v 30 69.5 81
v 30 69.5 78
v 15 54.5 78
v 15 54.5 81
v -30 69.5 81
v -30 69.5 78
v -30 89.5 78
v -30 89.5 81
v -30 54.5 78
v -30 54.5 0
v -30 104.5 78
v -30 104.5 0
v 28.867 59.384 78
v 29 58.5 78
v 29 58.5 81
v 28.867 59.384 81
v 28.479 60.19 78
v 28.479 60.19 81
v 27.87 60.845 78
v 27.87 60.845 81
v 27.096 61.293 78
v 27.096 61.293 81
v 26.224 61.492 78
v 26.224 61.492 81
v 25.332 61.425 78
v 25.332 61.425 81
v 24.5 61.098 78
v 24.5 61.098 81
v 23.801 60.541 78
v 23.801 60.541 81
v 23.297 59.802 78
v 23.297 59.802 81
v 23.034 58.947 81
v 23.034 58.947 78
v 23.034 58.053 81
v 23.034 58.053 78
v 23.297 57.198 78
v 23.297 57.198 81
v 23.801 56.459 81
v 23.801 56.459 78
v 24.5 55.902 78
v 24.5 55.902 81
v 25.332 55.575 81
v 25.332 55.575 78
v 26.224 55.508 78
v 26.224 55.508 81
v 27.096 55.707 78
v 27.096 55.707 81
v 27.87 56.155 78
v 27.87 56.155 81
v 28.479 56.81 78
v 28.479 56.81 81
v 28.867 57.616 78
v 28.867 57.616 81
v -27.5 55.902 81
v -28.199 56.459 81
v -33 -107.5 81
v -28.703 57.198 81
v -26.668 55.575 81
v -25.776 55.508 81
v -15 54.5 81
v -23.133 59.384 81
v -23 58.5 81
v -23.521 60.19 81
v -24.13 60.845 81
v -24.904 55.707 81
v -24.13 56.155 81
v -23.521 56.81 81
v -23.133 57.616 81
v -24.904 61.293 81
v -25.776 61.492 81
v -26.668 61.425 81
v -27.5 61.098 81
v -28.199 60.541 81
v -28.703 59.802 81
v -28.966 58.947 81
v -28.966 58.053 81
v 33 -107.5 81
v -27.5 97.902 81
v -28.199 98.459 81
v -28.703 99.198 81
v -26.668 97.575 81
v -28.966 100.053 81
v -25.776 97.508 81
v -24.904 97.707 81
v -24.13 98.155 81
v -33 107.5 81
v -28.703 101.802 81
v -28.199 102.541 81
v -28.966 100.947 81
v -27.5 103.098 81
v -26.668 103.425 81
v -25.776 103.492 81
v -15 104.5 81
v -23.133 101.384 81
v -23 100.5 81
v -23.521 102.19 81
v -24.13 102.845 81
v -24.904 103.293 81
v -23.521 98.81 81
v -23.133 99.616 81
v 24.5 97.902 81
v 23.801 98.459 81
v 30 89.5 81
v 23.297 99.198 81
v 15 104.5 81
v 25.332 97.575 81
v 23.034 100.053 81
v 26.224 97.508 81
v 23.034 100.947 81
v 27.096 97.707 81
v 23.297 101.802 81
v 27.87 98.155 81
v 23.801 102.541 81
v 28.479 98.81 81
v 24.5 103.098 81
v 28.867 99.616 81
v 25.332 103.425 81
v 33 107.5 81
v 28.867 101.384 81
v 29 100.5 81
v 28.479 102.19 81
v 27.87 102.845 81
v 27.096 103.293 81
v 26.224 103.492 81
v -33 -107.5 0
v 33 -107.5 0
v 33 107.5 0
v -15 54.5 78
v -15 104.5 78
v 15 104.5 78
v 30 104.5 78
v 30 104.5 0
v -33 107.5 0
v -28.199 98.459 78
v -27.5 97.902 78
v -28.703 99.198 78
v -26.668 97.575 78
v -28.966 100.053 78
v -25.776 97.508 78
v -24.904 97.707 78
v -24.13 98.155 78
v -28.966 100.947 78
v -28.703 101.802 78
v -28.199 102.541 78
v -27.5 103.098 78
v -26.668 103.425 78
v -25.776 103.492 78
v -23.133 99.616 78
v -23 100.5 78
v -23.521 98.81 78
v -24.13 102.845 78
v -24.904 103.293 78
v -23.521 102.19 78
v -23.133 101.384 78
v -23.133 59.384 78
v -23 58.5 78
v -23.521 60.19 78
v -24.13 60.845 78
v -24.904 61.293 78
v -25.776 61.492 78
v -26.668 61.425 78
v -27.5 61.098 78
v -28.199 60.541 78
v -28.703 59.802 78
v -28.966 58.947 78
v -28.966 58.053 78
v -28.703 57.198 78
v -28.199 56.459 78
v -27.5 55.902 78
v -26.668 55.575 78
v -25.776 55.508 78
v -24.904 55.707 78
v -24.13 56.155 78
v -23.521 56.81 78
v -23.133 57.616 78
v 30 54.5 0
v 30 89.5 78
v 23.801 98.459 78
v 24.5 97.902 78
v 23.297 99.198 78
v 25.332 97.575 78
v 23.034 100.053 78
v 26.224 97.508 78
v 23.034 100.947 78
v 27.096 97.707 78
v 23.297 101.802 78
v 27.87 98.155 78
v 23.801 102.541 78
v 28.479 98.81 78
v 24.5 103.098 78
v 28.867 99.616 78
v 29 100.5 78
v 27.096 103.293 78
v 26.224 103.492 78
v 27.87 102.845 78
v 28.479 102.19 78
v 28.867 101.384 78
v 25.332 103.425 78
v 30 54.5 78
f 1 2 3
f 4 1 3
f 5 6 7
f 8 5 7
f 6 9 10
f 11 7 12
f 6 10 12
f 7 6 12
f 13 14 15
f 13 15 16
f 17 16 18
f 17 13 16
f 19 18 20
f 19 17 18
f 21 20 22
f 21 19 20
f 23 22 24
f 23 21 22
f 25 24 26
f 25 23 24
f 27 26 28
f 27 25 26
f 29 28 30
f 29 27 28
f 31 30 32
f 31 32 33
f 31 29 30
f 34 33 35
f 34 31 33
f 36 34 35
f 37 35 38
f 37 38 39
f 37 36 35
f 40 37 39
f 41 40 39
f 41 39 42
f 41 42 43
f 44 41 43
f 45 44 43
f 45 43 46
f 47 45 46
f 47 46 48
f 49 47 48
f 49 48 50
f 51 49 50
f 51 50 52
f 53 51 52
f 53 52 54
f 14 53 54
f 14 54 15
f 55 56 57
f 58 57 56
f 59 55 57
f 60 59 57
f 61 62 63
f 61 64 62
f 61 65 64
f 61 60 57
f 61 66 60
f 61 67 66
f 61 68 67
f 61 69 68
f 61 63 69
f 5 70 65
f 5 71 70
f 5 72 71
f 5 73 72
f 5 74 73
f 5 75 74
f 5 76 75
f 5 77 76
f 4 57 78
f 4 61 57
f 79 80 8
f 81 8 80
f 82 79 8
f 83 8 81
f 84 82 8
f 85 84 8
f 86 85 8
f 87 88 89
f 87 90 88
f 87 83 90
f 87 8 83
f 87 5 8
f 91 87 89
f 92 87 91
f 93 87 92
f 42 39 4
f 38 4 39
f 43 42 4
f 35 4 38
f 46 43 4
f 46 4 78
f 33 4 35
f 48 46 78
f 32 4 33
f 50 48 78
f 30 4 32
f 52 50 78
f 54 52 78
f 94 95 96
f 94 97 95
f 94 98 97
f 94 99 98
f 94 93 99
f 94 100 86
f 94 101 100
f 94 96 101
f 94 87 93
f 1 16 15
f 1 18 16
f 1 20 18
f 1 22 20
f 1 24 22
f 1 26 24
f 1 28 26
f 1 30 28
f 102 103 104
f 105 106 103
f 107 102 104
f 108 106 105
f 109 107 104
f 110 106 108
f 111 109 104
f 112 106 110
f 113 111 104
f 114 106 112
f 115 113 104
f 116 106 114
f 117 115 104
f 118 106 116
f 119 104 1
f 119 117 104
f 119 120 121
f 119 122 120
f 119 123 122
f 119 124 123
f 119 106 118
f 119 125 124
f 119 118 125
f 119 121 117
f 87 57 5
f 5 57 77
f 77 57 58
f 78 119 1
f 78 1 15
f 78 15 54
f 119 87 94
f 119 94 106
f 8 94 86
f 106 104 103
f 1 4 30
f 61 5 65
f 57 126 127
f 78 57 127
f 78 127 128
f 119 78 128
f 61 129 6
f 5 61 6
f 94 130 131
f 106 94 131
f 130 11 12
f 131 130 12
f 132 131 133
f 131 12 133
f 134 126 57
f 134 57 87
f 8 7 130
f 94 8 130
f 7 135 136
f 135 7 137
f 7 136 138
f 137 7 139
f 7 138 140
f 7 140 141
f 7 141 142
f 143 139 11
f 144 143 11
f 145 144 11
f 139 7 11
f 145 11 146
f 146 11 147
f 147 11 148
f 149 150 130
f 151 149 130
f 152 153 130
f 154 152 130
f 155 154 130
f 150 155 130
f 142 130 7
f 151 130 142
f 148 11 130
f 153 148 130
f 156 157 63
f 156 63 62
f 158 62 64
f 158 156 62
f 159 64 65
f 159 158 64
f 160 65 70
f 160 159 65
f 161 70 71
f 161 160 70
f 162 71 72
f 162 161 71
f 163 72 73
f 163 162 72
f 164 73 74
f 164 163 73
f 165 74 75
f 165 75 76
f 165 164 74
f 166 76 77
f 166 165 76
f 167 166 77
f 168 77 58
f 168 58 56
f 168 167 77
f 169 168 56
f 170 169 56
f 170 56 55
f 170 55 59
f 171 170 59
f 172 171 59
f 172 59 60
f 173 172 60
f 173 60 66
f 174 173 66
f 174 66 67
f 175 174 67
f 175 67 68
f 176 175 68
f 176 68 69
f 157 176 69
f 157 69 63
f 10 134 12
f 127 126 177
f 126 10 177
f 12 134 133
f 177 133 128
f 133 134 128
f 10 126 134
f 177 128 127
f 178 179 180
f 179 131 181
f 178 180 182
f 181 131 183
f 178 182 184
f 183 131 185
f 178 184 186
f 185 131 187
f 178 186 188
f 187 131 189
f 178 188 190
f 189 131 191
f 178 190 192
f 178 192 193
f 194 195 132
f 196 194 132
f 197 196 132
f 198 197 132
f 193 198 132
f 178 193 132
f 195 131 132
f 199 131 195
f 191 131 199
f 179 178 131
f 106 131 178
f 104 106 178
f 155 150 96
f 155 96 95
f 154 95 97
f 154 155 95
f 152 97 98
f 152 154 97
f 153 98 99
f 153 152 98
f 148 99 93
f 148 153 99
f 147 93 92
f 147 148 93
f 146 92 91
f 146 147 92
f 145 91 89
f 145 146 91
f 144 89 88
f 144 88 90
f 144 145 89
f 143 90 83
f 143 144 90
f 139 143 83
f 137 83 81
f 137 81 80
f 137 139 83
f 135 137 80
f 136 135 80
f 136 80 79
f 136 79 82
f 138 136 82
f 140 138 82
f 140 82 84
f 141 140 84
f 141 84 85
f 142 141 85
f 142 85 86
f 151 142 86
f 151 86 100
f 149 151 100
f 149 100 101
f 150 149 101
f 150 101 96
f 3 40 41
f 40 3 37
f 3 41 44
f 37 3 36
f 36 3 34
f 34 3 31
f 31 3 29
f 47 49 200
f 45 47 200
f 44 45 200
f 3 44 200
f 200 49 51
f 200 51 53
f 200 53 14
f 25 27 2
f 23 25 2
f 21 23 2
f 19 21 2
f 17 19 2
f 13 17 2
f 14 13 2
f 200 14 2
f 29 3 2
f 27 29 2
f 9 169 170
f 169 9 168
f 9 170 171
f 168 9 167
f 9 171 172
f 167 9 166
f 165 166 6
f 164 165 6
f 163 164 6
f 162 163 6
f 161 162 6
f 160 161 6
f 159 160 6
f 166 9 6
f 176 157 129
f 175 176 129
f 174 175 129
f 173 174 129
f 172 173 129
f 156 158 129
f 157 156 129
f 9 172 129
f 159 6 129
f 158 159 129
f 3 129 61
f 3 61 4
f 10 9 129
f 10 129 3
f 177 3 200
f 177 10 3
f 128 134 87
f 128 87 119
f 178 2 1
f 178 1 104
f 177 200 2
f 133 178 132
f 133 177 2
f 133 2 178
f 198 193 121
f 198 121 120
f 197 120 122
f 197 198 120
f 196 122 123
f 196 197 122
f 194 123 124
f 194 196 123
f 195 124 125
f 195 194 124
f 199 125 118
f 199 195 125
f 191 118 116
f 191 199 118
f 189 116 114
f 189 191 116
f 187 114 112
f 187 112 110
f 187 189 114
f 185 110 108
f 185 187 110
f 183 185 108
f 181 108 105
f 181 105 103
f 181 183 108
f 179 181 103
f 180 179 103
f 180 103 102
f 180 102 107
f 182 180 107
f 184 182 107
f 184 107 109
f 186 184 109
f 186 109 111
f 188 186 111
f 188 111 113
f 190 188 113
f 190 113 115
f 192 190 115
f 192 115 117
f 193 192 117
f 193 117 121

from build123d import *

# Parameters (mm, degrees)
STRUCTURESKETCH_W      = 66
STRUCTURESKETCH_H      = 215
MAINSTRUCTURE_DEPTH    = 81
ZONESKETCH_R           = 3
CENTERPOCKET_DEPTH     = 81
ZONEFILLSKETCH_W       = 60
ZONEFILLSKETCH_H       = 50
CENTERFILLPOCKET_DEPTH = 78


with BuildPart() as part:
    # StructureSketch → MainStructure (new body)
    with BuildSketch(Plane.XY):
        Rectangle(STRUCTURESKETCH_W, STRUCTURESKETCH_H)
    extrude(amount=MAINSTRUCTURE_DEPTH)

    # ZoneSketch (on DatumPlane) → CenterPocket (cut)
    with BuildSketch(Plane(origin=(0, 79.5, 0), x_dir=(1, 0, 0), z_dir=(0, 0, 1))):
        with Locations((-26, 21)):
            Circle(ZONESKETCH_R)
        with Locations((26, 21)):
            Circle(ZONESKETCH_R)
        with Locations((26, -21)):
            Circle(ZONESKETCH_R)
        with Locations((-26, -21)):
            Circle(ZONESKETCH_R)
        Polygon((-15, 25), (15, 25), (30, 10), (30, -10), (15, -25), (-15, -25), (-30, -10), (-30, 10), align=None)
    extrude(amount=CENTERPOCKET_DEPTH, mode=Mode.SUBTRACT)

    # ZoneFillSketch (on DatumPlane) → CenterFillPocket (cut)
    with BuildSketch(Plane(origin=(0, 79.5, 0), x_dir=(1, 0, 0), z_dir=(0, 0, 1))):
        Rectangle(ZONEFILLSKETCH_W, ZONEFILLSKETCH_H)
    extrude(amount=CENTERFILLPOCKET_DEPTH, mode=Mode.SUBTRACT)


solid = part.part
